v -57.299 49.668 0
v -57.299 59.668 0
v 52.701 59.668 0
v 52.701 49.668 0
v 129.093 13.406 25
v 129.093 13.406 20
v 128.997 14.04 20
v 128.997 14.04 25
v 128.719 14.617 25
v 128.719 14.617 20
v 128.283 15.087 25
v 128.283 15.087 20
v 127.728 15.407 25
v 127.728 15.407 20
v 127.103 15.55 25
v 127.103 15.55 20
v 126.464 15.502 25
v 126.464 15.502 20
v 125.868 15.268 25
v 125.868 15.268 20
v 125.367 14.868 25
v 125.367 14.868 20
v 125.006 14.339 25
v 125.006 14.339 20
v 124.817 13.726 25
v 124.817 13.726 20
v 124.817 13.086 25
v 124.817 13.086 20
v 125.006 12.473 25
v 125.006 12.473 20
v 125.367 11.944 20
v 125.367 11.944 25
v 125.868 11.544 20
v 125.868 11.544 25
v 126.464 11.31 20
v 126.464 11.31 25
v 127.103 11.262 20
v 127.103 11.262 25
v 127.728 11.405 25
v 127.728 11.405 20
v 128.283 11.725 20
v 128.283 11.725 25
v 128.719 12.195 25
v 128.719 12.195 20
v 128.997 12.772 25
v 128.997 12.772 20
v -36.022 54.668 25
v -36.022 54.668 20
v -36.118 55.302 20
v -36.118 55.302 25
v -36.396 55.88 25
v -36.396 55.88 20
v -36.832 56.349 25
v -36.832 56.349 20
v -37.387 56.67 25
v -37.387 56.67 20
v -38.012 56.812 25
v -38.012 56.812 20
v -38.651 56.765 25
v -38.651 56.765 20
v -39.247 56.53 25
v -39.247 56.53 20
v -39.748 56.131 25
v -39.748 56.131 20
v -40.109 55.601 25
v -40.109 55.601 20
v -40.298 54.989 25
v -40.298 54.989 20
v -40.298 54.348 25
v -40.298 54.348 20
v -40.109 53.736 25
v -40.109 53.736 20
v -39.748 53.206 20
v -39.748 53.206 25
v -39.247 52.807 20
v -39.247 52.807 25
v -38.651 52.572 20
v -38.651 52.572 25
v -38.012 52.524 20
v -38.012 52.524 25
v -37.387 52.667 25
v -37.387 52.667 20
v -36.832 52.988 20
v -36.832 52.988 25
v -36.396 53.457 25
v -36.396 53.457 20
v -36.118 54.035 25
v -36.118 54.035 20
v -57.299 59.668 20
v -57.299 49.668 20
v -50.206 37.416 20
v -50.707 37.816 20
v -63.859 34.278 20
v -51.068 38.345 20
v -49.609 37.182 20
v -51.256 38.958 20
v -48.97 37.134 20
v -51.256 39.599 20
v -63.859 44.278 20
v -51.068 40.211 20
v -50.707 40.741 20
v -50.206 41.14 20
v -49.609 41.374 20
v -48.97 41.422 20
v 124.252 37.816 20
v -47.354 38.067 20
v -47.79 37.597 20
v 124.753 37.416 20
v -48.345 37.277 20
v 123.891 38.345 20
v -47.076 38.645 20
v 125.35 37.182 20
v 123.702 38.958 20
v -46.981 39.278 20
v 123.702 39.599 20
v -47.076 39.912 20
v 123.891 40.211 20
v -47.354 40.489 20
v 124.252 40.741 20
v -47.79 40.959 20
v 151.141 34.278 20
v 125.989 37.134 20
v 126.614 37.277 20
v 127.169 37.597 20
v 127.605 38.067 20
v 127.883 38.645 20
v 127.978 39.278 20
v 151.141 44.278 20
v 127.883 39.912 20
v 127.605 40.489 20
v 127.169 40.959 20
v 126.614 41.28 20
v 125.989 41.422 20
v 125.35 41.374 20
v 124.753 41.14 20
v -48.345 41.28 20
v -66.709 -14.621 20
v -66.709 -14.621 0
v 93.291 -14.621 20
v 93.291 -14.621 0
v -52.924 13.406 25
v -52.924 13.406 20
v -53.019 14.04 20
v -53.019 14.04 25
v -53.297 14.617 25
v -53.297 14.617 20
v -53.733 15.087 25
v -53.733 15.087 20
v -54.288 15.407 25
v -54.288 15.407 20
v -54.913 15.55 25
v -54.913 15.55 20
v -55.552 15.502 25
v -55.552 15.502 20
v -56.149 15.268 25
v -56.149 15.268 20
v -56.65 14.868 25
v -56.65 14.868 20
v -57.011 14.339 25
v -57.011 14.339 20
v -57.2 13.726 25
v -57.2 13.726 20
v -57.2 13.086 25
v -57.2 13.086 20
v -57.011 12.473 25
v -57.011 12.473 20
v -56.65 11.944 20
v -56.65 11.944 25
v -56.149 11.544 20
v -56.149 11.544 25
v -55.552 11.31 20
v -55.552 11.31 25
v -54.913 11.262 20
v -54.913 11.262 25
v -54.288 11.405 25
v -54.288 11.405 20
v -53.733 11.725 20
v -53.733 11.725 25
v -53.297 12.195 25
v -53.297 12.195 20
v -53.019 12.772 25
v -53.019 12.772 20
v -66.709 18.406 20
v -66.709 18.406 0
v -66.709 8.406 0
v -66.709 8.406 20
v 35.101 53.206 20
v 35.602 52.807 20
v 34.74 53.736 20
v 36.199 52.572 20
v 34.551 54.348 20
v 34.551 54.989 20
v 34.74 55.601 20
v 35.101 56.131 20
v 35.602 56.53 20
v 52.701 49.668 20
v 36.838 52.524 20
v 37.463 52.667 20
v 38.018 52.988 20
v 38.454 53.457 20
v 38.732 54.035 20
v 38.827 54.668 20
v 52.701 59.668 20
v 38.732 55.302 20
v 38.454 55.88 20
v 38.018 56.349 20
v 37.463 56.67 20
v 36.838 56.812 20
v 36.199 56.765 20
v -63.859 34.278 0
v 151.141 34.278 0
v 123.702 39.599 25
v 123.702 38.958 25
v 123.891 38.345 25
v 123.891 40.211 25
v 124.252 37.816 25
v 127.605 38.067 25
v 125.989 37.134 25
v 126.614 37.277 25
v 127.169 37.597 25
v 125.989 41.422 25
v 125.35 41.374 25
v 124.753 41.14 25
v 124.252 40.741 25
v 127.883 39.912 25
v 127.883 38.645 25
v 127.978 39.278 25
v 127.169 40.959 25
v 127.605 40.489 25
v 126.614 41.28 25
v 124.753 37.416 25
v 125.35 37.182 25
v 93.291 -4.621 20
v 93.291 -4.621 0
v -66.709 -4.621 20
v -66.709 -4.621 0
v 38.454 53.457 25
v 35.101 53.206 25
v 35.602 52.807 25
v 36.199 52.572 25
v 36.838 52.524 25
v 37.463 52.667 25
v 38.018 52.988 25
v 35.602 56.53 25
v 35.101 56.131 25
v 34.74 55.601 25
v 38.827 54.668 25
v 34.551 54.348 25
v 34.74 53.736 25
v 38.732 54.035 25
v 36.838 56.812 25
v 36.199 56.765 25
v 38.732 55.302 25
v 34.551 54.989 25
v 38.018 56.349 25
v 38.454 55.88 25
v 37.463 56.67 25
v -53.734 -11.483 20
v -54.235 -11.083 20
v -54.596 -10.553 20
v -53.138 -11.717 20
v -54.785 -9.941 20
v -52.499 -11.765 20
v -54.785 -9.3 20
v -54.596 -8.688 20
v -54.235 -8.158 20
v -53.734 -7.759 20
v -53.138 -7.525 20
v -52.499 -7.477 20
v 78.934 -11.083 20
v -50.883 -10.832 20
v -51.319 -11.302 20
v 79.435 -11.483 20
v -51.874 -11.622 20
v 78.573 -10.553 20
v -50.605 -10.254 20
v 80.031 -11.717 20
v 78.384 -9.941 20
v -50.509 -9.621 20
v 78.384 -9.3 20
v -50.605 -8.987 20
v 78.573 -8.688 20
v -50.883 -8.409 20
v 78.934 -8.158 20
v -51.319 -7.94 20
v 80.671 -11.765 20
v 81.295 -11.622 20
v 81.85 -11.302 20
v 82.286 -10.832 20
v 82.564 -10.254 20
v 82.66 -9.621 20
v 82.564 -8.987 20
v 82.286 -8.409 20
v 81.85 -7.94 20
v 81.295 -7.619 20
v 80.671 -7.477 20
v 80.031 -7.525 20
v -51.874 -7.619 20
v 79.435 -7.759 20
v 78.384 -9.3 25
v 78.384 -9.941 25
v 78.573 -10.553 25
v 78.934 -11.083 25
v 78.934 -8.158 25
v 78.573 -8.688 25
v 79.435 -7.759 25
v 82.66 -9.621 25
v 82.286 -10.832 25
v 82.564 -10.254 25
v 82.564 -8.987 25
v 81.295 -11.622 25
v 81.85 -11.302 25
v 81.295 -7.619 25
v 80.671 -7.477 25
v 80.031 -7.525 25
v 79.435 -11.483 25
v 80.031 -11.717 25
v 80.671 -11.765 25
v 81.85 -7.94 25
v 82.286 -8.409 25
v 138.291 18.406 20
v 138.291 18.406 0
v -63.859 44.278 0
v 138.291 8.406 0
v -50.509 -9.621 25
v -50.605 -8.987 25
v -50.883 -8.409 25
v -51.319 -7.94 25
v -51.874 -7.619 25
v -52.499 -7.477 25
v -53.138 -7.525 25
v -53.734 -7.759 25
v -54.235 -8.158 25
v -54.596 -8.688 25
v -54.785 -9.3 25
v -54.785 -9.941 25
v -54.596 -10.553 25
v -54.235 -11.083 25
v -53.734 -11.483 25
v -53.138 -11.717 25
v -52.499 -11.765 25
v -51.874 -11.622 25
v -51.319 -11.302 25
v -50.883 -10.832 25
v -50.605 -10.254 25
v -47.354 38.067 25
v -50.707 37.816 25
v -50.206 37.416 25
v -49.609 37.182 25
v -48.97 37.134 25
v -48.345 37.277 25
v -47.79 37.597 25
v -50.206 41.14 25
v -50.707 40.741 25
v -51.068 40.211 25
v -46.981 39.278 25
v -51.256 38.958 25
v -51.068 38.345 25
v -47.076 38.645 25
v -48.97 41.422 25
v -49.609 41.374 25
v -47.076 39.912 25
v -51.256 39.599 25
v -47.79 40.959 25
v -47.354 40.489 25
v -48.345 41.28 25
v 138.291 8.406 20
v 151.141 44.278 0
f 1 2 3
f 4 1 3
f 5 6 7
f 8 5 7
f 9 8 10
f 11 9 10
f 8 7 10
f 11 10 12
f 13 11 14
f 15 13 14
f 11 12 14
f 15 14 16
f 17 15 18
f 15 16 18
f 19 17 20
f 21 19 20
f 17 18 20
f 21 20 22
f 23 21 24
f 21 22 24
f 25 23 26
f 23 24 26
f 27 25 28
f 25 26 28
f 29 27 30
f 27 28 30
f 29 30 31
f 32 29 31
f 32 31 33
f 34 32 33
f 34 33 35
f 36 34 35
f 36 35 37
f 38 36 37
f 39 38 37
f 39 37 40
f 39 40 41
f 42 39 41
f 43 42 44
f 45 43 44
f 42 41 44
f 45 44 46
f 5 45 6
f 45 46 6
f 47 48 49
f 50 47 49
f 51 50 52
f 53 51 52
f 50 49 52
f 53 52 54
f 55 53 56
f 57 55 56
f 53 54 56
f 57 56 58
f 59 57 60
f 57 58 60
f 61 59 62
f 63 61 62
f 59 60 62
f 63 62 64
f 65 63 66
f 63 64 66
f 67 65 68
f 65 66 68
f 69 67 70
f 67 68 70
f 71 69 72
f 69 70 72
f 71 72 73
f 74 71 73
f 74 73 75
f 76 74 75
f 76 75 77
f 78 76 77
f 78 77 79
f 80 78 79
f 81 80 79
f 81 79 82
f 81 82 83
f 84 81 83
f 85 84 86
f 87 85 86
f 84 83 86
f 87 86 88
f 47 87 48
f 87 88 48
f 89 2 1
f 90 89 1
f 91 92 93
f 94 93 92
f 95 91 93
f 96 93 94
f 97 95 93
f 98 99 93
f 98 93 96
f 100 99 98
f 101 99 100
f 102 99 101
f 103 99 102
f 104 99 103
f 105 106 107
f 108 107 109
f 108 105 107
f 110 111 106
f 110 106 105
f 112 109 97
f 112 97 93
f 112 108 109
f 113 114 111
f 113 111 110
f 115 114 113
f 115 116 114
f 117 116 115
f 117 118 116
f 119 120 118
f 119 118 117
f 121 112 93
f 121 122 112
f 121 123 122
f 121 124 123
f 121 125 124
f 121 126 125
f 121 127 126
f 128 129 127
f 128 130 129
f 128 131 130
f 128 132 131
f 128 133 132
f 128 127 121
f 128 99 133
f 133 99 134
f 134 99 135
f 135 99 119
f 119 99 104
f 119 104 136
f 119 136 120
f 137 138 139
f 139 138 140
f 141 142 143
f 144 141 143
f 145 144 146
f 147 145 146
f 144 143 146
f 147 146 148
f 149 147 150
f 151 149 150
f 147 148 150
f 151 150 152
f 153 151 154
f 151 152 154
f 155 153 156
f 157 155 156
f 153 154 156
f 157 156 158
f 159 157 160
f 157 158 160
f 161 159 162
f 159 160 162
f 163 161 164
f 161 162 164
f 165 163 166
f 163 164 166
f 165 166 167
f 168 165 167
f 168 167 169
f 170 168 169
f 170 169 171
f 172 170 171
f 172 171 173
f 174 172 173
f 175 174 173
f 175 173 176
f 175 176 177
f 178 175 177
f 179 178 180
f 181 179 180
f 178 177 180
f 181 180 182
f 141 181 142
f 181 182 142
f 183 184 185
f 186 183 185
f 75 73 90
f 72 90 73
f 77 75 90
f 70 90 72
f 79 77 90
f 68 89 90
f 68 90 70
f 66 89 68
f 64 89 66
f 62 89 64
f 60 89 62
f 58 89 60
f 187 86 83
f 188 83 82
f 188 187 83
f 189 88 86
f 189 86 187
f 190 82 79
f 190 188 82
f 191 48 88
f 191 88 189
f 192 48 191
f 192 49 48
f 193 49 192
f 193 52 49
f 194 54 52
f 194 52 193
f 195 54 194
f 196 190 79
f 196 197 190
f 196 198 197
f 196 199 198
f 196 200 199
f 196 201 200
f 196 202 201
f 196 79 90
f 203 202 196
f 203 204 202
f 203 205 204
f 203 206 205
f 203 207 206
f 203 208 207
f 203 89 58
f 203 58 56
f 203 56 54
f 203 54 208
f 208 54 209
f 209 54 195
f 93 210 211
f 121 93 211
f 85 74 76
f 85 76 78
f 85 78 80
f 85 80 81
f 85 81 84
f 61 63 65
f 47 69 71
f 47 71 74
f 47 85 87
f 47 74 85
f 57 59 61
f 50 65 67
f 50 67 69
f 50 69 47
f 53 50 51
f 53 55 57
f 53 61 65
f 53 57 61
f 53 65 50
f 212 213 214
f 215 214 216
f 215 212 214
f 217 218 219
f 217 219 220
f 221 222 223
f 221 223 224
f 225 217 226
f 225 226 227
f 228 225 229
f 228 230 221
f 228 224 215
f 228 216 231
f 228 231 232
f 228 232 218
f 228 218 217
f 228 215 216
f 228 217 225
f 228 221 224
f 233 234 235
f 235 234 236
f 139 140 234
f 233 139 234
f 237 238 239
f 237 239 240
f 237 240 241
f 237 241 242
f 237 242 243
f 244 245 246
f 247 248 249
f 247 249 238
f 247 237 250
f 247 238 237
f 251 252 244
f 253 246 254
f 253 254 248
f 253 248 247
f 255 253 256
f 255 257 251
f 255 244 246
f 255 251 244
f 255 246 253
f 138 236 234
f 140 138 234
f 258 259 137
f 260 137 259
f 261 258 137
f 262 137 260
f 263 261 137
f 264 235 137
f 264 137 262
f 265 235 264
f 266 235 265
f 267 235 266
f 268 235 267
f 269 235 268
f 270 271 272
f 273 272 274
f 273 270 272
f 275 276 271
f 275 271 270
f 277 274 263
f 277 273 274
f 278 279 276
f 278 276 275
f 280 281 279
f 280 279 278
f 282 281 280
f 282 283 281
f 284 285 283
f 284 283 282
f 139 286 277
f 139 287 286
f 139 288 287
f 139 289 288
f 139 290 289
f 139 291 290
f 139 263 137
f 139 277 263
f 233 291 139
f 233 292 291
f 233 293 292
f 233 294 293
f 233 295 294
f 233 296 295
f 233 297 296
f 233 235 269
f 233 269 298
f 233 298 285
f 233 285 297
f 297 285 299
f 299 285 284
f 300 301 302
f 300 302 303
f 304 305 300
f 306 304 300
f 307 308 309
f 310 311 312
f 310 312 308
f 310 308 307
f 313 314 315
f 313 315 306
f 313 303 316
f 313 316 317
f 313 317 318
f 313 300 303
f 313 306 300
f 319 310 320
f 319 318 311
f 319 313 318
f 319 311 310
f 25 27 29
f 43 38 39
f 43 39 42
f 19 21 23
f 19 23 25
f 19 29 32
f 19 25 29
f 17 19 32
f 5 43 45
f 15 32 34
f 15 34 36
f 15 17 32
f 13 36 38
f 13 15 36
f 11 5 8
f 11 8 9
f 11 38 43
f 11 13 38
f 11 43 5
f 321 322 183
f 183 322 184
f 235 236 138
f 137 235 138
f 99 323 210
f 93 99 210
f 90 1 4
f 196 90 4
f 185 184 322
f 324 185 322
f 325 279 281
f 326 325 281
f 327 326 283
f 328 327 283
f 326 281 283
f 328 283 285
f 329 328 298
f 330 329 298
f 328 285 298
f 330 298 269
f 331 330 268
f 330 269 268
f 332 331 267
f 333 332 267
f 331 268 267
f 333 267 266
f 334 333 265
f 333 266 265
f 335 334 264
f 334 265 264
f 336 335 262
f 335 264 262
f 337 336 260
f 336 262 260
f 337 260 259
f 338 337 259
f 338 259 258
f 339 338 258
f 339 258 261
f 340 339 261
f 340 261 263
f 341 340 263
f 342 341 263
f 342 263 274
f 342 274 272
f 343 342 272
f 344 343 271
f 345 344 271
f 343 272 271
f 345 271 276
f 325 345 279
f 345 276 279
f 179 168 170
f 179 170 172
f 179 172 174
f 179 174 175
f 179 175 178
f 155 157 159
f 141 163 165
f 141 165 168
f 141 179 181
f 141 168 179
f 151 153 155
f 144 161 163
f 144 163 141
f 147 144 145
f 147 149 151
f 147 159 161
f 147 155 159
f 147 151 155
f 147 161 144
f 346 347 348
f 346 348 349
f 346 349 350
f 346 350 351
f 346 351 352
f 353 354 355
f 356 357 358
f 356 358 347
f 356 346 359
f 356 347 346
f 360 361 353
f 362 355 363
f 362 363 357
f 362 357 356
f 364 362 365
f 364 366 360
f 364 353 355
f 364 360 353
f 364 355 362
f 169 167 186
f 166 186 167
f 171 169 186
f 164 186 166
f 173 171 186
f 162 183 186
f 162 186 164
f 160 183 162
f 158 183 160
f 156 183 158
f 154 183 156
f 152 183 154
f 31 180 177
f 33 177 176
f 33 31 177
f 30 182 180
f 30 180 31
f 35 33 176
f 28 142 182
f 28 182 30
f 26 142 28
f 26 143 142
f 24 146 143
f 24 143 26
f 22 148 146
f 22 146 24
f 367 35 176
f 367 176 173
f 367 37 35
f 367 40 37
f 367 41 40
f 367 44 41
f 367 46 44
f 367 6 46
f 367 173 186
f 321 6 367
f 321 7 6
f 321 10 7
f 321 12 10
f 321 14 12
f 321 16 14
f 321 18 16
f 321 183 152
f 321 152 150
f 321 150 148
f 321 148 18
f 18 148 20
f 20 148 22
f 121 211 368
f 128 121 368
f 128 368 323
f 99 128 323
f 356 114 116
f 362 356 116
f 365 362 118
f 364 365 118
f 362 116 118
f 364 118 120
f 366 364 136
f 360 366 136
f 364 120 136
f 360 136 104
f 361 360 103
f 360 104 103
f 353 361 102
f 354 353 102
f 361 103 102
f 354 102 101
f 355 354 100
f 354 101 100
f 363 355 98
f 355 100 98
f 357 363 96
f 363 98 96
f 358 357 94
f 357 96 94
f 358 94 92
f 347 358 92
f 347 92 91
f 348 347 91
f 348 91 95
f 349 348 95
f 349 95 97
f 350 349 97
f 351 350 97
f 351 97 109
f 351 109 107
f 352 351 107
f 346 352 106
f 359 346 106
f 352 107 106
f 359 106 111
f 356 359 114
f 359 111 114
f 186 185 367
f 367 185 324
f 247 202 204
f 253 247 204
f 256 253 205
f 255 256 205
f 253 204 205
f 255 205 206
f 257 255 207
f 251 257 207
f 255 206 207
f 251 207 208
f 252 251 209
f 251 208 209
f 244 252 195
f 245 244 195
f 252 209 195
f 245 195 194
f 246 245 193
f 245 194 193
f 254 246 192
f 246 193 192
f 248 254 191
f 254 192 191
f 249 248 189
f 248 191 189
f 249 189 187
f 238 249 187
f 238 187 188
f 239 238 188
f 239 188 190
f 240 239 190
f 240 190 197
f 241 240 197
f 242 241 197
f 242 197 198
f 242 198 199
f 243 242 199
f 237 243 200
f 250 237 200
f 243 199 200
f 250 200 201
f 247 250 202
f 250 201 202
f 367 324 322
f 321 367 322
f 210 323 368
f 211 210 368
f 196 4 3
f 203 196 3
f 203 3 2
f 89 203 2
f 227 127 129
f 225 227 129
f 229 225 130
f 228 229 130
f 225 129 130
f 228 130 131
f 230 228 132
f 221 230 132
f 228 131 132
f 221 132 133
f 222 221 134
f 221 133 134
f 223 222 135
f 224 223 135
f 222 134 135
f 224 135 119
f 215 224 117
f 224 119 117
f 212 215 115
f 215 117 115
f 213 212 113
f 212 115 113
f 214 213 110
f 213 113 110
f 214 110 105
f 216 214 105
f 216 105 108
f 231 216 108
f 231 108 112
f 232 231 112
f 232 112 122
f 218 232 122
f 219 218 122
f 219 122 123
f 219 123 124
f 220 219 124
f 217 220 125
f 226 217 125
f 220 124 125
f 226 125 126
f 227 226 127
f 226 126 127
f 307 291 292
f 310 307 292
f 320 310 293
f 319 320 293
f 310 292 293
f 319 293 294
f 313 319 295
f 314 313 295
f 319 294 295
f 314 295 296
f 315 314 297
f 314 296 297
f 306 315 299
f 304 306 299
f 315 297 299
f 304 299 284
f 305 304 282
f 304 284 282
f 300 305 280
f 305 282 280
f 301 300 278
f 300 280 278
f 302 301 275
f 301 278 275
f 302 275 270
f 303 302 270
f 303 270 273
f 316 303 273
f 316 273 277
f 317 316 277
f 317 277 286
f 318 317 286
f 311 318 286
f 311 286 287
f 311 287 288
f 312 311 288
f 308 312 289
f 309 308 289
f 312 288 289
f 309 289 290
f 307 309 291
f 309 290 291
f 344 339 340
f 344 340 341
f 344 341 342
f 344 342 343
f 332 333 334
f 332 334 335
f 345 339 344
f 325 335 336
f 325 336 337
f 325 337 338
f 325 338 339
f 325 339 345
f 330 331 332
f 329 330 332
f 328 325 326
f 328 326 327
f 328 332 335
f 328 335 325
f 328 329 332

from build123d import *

# Parameters (mm, degrees)
F1_DEPTH  = 20
F2_DEPTH  = 20
F3_R      = 2.15
F4_DEPTH  = 5
F5_R      = 2.15
F6_DEPTH  = 5
F7_R      = 2.15
F8_DEPTH  = 5
F9_R      = 2.15
F10_DEPTH = 5


with BuildPart() as f1:
    # F0 (on Top) → F1 (new body)
    with BuildSketch(Plane.XY):
        Polygon((-42.29854, 59.668465), (-57.29854, 59.668465), (-57.29854, 49.668465), (-42.29854, 49.668465), (38.570829, 49.668465), (52.70146, 49.668465), (52.70146, 59.668465), (37.70146, 59.668465), align=None)
    extrude(amount=F1_DEPTH)

    # F0 (on Top) → F2 (join)
    with BuildSketch(Plane.XY):
        Polygon((-42.29854, 59.668465), (-57.29854, 59.668465), (-57.29854, 49.668465), (-42.29854, 49.668465), (38.570829, 49.668465), (52.70146, 49.668465), (52.70146, 59.668465), (37.70146, 59.668465), align=None)
        Polygon((-48.859455, 44.278236), (-63.859455, 44.278236), (-63.859455, 34.278236), (-48.859455, 34.278236), (136.140545, 34.278236), (151.140545, 34.278236), (151.140545, 44.278236), (136.140545, 44.278236), align=None)
        Polygon((-51.709455, 18.406053), (-66.709455, 18.406053), (-66.709455, 8.406053), (138.290545, 8.406053), (138.290545, 13.406053), (138.290545, 18.406053), (123.290545, 18.406053), align=None)
        Polygon((-51.709455, -4.620614), (-66.709455, -4.620614), (-66.709455, -14.620614), (93.290545, -14.620614), (93.290545, -9.620614), (93.290545, -4.620614), (78.290545, -4.620614), align=None)
    extrude(amount=F2_DEPTH)

    # F3 (on face) → F4 (join)
    with BuildSketch(Plane.XY.offset(20)):
        with Locations((-38.172364, 54.668465)):
            Circle(F3_R)
        with Locations((36.677286, 54.668465)):
            Circle(F3_R)
    extrude(amount=F4_DEPTH)

    # F5 (on face) → F6 (join)
    with BuildSketch(Plane.XY.offset(20)):
        with Locations((-49.130503, 39.278236)):
            Circle(F5_R)
        with Locations((125.828236, 39.278236)):
            Circle(F5_R)
    extrude(amount=F6_DEPTH)

    # F7 (on face) → F8 (join)
    with BuildSketch(Plane.XY.offset(20)):
        with Locations((-55.073898, 13.406053)):
            Circle(F7_R)
        with Locations((126.94262, 13.406053)):
            Circle(F7_R)
    extrude(amount=F8_DEPTH)

    # F9 (on face) → F10 (join)
    with BuildSketch(Plane.XY.offset(20)):
        with Locations((-52.659392, -9.620614)):
            Circle(F9_R)
        with Locations((80.509834, -9.620614)):
            Circle(F9_R)
    extrude(amount=F10_DEPTH)


solid = f1.part
